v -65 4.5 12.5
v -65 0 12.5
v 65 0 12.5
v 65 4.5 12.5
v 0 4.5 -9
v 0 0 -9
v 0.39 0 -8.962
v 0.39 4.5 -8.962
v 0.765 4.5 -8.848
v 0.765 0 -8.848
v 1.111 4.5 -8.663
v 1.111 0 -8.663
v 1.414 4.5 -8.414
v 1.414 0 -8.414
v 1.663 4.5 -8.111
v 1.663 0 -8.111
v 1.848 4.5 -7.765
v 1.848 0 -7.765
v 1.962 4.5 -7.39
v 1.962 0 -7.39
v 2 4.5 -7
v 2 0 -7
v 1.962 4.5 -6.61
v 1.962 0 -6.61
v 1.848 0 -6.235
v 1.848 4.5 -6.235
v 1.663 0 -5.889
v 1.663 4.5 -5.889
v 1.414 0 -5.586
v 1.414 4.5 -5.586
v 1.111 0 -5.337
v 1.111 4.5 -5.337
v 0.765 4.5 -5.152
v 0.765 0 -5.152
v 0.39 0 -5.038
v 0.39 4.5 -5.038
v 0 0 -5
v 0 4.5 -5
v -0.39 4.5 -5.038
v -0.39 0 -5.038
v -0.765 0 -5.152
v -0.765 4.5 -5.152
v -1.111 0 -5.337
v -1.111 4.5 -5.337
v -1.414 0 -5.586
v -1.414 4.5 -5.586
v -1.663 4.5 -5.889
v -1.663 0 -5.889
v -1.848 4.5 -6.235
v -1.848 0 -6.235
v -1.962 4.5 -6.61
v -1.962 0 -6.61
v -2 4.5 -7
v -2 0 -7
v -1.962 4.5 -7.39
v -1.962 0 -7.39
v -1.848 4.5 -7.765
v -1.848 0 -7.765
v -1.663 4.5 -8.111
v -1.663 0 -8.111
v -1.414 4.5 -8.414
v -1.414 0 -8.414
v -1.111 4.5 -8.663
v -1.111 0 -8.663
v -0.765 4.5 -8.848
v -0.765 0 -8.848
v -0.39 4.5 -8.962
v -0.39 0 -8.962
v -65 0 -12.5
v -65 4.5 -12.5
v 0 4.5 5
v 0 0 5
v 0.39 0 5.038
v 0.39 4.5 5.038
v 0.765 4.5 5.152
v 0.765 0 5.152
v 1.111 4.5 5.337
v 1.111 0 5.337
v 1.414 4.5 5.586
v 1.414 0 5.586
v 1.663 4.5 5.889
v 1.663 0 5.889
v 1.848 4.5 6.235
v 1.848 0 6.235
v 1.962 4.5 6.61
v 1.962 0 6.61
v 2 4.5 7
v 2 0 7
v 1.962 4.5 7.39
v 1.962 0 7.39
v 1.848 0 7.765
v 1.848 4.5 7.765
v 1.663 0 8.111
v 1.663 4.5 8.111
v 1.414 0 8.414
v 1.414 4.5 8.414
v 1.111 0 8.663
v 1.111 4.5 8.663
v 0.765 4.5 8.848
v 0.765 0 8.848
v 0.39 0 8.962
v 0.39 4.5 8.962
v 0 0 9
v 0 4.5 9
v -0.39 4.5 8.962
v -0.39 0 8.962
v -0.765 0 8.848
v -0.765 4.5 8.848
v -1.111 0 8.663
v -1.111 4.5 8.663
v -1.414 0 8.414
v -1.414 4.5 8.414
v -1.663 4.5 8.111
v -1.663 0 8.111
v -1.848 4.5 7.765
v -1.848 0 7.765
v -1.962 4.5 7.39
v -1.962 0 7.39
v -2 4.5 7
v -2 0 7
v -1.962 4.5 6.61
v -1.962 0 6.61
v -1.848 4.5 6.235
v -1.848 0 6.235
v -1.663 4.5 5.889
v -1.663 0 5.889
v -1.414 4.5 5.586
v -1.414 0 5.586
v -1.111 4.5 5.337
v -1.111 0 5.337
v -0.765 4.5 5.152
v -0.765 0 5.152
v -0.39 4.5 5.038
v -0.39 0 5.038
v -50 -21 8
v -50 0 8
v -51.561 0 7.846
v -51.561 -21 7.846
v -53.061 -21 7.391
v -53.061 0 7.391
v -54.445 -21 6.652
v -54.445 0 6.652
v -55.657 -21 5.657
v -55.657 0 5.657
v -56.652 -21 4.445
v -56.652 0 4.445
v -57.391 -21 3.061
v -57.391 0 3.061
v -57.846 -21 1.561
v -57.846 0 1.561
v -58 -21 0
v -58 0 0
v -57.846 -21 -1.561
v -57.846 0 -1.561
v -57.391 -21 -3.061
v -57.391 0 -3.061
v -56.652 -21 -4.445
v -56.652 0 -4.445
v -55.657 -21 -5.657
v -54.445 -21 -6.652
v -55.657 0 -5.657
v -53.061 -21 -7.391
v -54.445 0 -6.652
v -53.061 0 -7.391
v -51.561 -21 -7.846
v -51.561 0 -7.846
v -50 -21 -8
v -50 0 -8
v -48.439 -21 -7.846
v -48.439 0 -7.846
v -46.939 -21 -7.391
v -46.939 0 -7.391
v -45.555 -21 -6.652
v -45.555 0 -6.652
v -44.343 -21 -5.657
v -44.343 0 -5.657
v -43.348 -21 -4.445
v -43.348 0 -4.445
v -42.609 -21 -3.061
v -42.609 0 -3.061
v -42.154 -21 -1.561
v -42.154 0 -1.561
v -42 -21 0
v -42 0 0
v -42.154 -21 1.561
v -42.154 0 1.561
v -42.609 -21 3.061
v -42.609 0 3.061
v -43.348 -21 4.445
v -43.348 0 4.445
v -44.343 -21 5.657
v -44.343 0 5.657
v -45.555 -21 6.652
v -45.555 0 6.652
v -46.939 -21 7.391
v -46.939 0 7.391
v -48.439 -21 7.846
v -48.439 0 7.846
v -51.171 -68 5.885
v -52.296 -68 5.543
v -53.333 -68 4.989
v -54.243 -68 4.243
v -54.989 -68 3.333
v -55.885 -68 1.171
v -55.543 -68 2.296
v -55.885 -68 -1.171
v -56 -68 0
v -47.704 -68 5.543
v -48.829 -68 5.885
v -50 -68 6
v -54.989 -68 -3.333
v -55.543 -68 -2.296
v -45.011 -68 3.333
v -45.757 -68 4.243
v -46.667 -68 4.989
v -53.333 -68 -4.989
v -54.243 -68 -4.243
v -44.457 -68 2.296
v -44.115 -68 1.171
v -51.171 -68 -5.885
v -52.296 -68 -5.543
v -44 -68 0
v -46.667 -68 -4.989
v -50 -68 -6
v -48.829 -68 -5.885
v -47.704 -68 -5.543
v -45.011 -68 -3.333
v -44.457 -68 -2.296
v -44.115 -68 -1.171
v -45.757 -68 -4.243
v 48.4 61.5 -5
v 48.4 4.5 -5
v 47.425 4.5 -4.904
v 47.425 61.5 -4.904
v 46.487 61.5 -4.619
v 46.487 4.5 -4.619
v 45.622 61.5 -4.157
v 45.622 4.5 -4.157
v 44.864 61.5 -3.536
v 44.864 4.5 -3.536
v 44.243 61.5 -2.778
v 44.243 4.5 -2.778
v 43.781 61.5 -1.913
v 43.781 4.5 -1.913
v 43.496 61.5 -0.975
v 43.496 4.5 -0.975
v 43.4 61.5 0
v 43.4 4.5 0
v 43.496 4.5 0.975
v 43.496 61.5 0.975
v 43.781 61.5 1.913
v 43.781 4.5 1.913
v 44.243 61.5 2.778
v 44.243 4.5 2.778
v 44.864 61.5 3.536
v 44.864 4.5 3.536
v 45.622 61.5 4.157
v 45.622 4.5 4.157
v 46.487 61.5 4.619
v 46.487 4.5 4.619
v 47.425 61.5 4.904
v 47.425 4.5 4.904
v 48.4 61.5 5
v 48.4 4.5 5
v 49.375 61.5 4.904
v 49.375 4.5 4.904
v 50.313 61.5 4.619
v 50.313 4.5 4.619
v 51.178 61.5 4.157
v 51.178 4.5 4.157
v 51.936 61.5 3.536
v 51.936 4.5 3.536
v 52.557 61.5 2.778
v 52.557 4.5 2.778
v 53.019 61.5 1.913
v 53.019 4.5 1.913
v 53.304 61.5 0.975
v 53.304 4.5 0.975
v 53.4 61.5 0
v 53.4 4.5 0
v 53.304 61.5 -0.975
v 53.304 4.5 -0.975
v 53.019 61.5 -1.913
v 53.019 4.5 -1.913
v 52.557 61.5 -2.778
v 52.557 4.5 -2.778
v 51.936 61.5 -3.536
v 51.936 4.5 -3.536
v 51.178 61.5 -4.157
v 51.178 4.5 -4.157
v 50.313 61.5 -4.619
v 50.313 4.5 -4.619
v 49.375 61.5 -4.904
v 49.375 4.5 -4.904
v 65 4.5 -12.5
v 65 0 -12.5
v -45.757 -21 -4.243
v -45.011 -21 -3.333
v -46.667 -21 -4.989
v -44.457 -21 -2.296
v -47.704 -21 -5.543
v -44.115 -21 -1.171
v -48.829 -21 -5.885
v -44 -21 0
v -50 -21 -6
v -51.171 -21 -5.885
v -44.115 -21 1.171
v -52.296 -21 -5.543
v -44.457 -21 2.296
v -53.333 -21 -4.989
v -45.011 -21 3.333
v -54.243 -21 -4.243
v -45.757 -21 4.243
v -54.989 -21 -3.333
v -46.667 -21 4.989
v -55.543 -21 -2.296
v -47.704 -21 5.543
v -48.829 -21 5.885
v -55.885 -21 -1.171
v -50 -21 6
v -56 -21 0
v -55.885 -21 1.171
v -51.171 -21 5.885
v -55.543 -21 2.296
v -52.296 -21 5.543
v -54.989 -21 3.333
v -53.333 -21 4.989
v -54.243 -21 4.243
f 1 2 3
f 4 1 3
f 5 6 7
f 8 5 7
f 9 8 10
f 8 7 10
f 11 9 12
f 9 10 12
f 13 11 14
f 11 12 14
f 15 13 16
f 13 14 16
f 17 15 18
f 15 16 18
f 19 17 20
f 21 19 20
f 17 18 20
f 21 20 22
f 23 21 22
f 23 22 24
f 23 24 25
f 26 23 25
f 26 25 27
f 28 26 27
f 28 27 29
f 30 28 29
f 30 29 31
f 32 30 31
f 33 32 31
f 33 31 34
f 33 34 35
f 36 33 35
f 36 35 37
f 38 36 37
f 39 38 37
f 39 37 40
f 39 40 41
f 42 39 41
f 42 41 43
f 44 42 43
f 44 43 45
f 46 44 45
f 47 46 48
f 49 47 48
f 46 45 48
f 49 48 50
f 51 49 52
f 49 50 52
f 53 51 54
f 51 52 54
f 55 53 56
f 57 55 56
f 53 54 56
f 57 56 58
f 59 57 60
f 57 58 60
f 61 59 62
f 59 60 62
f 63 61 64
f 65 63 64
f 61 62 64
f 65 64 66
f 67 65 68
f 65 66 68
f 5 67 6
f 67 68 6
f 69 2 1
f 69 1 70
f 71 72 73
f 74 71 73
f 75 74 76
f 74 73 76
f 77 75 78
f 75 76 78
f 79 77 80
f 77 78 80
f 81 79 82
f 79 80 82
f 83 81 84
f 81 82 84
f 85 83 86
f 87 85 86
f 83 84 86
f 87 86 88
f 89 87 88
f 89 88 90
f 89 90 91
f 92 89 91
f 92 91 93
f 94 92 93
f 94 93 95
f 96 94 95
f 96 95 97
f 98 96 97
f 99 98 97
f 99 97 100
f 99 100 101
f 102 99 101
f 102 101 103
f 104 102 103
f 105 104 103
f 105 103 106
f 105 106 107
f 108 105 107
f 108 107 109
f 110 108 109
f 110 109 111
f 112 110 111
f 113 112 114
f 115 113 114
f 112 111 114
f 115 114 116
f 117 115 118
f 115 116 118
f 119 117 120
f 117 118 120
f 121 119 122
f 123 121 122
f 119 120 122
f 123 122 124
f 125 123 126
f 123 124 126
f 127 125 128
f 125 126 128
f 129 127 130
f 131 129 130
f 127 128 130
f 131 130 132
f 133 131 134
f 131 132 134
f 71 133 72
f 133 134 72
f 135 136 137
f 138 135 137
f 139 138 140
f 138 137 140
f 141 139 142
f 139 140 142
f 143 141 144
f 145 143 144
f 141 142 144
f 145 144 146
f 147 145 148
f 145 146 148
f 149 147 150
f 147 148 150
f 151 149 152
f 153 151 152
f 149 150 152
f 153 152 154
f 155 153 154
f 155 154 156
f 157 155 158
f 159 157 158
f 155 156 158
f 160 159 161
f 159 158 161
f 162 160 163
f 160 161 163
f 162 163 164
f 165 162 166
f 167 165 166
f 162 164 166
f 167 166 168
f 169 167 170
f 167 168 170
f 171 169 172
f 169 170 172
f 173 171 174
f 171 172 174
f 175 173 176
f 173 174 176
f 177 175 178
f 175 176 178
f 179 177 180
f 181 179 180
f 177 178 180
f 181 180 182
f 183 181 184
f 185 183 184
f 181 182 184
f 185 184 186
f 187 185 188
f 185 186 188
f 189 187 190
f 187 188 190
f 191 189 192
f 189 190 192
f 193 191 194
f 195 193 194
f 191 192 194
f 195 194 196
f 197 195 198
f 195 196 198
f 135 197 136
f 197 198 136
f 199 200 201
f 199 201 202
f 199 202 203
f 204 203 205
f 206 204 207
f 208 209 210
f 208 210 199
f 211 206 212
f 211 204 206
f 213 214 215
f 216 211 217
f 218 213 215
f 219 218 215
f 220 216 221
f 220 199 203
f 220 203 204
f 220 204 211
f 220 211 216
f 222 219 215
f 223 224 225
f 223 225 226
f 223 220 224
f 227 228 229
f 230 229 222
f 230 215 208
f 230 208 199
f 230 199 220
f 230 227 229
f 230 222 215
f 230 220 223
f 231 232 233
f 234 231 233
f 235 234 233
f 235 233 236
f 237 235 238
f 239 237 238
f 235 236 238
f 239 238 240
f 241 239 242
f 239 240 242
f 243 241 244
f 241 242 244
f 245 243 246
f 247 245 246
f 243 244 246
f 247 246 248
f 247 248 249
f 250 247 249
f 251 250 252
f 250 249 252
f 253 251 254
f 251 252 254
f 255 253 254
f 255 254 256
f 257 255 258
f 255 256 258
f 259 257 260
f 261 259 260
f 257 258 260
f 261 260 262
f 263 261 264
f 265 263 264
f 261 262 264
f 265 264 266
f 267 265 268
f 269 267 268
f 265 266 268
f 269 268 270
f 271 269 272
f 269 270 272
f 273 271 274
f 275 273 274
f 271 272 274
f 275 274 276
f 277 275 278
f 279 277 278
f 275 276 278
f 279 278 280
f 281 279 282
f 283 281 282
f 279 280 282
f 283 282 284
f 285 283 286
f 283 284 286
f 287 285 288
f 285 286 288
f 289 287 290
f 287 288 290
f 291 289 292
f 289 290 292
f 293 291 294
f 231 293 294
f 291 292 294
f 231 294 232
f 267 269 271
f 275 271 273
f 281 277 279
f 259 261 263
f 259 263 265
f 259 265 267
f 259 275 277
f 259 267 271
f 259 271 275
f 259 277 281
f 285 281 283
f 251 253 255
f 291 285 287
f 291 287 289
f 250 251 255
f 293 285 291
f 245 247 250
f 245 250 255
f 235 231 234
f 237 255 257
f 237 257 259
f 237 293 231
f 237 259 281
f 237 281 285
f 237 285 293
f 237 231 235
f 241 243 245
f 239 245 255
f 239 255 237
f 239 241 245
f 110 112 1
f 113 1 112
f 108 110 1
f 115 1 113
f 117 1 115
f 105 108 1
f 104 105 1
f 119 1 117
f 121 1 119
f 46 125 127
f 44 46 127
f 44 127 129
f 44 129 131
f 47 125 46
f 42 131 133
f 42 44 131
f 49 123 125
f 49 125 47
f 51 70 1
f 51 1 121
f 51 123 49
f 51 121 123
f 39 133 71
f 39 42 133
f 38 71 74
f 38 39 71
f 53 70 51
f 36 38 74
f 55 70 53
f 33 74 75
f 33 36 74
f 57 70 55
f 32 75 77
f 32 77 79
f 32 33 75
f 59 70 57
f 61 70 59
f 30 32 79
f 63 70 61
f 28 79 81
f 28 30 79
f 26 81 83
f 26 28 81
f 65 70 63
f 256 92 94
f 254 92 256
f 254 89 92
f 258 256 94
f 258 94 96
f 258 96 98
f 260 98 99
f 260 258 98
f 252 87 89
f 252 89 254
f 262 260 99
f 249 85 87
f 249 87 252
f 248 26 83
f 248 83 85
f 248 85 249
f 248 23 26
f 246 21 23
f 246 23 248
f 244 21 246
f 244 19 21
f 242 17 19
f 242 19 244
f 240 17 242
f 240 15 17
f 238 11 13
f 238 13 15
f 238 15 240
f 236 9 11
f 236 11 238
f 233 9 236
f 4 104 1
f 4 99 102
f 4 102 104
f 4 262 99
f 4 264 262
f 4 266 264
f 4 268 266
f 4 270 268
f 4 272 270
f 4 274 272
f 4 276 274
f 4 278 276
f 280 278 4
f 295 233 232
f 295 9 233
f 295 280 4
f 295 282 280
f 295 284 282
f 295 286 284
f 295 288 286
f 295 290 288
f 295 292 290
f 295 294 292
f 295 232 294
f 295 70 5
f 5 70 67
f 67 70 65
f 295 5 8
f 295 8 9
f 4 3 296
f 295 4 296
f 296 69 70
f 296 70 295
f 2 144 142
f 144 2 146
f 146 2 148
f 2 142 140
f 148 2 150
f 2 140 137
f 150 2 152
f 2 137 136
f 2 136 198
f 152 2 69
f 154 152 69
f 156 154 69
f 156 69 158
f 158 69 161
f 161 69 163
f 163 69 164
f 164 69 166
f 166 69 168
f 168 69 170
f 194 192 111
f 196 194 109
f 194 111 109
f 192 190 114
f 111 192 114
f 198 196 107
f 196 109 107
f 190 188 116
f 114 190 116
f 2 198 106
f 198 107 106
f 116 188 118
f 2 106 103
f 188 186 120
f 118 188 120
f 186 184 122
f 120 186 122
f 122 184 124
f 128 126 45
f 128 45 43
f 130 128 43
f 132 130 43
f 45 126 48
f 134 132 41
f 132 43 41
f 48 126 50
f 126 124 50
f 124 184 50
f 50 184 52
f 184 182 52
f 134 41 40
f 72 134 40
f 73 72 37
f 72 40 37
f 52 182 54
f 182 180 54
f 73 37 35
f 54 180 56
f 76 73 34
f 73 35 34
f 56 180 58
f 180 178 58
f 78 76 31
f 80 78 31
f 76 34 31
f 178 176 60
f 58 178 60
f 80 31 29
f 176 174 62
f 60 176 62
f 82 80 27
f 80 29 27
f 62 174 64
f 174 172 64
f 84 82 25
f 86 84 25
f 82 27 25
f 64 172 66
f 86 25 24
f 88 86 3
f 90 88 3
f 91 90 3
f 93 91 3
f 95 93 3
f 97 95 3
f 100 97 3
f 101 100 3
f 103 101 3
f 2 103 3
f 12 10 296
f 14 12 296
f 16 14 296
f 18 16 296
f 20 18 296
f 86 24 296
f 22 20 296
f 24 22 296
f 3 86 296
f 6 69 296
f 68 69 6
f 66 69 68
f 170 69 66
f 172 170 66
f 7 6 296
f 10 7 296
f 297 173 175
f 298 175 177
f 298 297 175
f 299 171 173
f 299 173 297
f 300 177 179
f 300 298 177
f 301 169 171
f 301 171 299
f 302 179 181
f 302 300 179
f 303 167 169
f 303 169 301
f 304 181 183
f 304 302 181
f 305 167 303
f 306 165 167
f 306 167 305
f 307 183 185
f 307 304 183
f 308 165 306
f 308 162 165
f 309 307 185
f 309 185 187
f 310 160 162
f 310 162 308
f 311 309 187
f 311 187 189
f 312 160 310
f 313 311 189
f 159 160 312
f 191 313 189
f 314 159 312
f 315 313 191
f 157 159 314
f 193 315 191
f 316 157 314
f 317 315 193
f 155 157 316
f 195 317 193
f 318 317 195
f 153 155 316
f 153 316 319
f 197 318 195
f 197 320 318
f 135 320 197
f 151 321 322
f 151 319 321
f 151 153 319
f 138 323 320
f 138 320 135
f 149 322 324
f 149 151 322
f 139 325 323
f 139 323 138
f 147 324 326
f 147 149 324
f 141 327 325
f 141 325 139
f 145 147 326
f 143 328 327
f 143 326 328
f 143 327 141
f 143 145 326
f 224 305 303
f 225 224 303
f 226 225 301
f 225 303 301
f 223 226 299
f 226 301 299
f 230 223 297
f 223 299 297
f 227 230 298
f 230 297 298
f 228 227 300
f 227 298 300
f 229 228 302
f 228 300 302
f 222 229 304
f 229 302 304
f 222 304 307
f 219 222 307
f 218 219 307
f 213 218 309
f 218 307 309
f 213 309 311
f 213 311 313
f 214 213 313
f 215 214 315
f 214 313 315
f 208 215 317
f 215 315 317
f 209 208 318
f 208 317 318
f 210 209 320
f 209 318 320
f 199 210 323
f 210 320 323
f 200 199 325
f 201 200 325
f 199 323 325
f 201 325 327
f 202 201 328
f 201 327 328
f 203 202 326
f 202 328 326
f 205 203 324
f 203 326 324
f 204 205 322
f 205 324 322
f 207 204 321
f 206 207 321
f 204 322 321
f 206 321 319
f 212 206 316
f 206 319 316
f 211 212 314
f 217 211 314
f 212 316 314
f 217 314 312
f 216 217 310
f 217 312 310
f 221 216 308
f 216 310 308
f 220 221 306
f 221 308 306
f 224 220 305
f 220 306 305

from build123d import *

# Parameters (mm, degrees)
SKETCH_1_W          = 130
SKETCH_1_H          = 25
EXTRUDE_1_DEPTH     = 4.5
SKETCH_2_R          = 5
EXTRUDE_2_DEPTH     = 57
SKETCH_3_R          = 8
EXTRUDE_3_DEPTH     = 21
SKETCH_4_R          = 6
EXTRUDE_4_DEPTH     = 47
CUT_EXTRUDE_1_REACH = 96.896
SKETCH_5_R          = 2


with BuildPart() as part:
    # Эскиз1 → Бобышка-Вытянуть1 (new body)
    with BuildSketch(Plane(origin=(0, 0, 0), x_dir=(1, 0, 0), z_dir=(0, 1, 0))):
        Rectangle(SKETCH_1_W, SKETCH_1_H)
    extrude(amount=EXTRUDE_1_DEPTH)

    # Эскиз2 → Бобышка-Вытянуть2 (add)
    with BuildSketch(Plane(origin=(0, 4.5, 0), x_dir=(1, 0, 0), z_dir=(0, 1, 0))):
        with Locations(Location((48.4, 0, 0), (0, 0, 90))):
            Circle(SKETCH_2_R)
    extrude(amount=EXTRUDE_2_DEPTH)

    # Эскиз3 → Бобышка-Вытянуть3 (add)
    with BuildSketch(Plane.XZ):
        with Locations(Location((-50, 0, 0), (0, 0, 90))):
            Circle(SKETCH_3_R)
    extrude(amount=EXTRUDE_3_DEPTH)

    # Эскиз4 → Бобышка-Вытянуть4 (add)
    with BuildSketch(Plane.XZ.offset(21)):
        with Locations(Location((-50, 0, 0), (0, 0, 270))):
            Circle(SKETCH_4_R)
    extrude(amount=EXTRUDE_4_DEPTH)

    # Эскиз5 → Вырез-Вытянуть1 (cut, up to next)
    with BuildSketch(Plane.XZ, mode=Mode.PRIVATE) as cut_extrude_1_sk1:
        with Locations(Location((0, 7, 0), (0, 0, 270))):
            Circle(SKETCH_5_R)
    cut_extrude_1_tool1 = extrude(cut_extrude_1_sk1.sketch, amount=-CUT_EXTRUDE_1_REACH, mode=Mode.PRIVATE) & part.part
    # Эскиз5 → Вырез-Вытянуть1 (cut, up to next)
    with BuildSketch(Plane.XZ, mode=Mode.PRIVATE) as cut_extrude_1_sk2:
        with Locations(Location((0, -7, 0), (0, 0, 270))):
            Circle(SKETCH_5_R)
    cut_extrude_1_tool2 = extrude(cut_extrude_1_sk2.sketch, amount=-CUT_EXTRUDE_1_REACH, mode=Mode.PRIVATE) & part.part
    add(cut_extrude_1_tool1.solids().sort_by_distance((0, 0, 7))[0], mode=Mode.SUBTRACT)
    add(cut_extrude_1_tool2.solids().sort_by_distance((0, 0, -7))[0], mode=Mode.SUBTRACT)


solid = part.part
